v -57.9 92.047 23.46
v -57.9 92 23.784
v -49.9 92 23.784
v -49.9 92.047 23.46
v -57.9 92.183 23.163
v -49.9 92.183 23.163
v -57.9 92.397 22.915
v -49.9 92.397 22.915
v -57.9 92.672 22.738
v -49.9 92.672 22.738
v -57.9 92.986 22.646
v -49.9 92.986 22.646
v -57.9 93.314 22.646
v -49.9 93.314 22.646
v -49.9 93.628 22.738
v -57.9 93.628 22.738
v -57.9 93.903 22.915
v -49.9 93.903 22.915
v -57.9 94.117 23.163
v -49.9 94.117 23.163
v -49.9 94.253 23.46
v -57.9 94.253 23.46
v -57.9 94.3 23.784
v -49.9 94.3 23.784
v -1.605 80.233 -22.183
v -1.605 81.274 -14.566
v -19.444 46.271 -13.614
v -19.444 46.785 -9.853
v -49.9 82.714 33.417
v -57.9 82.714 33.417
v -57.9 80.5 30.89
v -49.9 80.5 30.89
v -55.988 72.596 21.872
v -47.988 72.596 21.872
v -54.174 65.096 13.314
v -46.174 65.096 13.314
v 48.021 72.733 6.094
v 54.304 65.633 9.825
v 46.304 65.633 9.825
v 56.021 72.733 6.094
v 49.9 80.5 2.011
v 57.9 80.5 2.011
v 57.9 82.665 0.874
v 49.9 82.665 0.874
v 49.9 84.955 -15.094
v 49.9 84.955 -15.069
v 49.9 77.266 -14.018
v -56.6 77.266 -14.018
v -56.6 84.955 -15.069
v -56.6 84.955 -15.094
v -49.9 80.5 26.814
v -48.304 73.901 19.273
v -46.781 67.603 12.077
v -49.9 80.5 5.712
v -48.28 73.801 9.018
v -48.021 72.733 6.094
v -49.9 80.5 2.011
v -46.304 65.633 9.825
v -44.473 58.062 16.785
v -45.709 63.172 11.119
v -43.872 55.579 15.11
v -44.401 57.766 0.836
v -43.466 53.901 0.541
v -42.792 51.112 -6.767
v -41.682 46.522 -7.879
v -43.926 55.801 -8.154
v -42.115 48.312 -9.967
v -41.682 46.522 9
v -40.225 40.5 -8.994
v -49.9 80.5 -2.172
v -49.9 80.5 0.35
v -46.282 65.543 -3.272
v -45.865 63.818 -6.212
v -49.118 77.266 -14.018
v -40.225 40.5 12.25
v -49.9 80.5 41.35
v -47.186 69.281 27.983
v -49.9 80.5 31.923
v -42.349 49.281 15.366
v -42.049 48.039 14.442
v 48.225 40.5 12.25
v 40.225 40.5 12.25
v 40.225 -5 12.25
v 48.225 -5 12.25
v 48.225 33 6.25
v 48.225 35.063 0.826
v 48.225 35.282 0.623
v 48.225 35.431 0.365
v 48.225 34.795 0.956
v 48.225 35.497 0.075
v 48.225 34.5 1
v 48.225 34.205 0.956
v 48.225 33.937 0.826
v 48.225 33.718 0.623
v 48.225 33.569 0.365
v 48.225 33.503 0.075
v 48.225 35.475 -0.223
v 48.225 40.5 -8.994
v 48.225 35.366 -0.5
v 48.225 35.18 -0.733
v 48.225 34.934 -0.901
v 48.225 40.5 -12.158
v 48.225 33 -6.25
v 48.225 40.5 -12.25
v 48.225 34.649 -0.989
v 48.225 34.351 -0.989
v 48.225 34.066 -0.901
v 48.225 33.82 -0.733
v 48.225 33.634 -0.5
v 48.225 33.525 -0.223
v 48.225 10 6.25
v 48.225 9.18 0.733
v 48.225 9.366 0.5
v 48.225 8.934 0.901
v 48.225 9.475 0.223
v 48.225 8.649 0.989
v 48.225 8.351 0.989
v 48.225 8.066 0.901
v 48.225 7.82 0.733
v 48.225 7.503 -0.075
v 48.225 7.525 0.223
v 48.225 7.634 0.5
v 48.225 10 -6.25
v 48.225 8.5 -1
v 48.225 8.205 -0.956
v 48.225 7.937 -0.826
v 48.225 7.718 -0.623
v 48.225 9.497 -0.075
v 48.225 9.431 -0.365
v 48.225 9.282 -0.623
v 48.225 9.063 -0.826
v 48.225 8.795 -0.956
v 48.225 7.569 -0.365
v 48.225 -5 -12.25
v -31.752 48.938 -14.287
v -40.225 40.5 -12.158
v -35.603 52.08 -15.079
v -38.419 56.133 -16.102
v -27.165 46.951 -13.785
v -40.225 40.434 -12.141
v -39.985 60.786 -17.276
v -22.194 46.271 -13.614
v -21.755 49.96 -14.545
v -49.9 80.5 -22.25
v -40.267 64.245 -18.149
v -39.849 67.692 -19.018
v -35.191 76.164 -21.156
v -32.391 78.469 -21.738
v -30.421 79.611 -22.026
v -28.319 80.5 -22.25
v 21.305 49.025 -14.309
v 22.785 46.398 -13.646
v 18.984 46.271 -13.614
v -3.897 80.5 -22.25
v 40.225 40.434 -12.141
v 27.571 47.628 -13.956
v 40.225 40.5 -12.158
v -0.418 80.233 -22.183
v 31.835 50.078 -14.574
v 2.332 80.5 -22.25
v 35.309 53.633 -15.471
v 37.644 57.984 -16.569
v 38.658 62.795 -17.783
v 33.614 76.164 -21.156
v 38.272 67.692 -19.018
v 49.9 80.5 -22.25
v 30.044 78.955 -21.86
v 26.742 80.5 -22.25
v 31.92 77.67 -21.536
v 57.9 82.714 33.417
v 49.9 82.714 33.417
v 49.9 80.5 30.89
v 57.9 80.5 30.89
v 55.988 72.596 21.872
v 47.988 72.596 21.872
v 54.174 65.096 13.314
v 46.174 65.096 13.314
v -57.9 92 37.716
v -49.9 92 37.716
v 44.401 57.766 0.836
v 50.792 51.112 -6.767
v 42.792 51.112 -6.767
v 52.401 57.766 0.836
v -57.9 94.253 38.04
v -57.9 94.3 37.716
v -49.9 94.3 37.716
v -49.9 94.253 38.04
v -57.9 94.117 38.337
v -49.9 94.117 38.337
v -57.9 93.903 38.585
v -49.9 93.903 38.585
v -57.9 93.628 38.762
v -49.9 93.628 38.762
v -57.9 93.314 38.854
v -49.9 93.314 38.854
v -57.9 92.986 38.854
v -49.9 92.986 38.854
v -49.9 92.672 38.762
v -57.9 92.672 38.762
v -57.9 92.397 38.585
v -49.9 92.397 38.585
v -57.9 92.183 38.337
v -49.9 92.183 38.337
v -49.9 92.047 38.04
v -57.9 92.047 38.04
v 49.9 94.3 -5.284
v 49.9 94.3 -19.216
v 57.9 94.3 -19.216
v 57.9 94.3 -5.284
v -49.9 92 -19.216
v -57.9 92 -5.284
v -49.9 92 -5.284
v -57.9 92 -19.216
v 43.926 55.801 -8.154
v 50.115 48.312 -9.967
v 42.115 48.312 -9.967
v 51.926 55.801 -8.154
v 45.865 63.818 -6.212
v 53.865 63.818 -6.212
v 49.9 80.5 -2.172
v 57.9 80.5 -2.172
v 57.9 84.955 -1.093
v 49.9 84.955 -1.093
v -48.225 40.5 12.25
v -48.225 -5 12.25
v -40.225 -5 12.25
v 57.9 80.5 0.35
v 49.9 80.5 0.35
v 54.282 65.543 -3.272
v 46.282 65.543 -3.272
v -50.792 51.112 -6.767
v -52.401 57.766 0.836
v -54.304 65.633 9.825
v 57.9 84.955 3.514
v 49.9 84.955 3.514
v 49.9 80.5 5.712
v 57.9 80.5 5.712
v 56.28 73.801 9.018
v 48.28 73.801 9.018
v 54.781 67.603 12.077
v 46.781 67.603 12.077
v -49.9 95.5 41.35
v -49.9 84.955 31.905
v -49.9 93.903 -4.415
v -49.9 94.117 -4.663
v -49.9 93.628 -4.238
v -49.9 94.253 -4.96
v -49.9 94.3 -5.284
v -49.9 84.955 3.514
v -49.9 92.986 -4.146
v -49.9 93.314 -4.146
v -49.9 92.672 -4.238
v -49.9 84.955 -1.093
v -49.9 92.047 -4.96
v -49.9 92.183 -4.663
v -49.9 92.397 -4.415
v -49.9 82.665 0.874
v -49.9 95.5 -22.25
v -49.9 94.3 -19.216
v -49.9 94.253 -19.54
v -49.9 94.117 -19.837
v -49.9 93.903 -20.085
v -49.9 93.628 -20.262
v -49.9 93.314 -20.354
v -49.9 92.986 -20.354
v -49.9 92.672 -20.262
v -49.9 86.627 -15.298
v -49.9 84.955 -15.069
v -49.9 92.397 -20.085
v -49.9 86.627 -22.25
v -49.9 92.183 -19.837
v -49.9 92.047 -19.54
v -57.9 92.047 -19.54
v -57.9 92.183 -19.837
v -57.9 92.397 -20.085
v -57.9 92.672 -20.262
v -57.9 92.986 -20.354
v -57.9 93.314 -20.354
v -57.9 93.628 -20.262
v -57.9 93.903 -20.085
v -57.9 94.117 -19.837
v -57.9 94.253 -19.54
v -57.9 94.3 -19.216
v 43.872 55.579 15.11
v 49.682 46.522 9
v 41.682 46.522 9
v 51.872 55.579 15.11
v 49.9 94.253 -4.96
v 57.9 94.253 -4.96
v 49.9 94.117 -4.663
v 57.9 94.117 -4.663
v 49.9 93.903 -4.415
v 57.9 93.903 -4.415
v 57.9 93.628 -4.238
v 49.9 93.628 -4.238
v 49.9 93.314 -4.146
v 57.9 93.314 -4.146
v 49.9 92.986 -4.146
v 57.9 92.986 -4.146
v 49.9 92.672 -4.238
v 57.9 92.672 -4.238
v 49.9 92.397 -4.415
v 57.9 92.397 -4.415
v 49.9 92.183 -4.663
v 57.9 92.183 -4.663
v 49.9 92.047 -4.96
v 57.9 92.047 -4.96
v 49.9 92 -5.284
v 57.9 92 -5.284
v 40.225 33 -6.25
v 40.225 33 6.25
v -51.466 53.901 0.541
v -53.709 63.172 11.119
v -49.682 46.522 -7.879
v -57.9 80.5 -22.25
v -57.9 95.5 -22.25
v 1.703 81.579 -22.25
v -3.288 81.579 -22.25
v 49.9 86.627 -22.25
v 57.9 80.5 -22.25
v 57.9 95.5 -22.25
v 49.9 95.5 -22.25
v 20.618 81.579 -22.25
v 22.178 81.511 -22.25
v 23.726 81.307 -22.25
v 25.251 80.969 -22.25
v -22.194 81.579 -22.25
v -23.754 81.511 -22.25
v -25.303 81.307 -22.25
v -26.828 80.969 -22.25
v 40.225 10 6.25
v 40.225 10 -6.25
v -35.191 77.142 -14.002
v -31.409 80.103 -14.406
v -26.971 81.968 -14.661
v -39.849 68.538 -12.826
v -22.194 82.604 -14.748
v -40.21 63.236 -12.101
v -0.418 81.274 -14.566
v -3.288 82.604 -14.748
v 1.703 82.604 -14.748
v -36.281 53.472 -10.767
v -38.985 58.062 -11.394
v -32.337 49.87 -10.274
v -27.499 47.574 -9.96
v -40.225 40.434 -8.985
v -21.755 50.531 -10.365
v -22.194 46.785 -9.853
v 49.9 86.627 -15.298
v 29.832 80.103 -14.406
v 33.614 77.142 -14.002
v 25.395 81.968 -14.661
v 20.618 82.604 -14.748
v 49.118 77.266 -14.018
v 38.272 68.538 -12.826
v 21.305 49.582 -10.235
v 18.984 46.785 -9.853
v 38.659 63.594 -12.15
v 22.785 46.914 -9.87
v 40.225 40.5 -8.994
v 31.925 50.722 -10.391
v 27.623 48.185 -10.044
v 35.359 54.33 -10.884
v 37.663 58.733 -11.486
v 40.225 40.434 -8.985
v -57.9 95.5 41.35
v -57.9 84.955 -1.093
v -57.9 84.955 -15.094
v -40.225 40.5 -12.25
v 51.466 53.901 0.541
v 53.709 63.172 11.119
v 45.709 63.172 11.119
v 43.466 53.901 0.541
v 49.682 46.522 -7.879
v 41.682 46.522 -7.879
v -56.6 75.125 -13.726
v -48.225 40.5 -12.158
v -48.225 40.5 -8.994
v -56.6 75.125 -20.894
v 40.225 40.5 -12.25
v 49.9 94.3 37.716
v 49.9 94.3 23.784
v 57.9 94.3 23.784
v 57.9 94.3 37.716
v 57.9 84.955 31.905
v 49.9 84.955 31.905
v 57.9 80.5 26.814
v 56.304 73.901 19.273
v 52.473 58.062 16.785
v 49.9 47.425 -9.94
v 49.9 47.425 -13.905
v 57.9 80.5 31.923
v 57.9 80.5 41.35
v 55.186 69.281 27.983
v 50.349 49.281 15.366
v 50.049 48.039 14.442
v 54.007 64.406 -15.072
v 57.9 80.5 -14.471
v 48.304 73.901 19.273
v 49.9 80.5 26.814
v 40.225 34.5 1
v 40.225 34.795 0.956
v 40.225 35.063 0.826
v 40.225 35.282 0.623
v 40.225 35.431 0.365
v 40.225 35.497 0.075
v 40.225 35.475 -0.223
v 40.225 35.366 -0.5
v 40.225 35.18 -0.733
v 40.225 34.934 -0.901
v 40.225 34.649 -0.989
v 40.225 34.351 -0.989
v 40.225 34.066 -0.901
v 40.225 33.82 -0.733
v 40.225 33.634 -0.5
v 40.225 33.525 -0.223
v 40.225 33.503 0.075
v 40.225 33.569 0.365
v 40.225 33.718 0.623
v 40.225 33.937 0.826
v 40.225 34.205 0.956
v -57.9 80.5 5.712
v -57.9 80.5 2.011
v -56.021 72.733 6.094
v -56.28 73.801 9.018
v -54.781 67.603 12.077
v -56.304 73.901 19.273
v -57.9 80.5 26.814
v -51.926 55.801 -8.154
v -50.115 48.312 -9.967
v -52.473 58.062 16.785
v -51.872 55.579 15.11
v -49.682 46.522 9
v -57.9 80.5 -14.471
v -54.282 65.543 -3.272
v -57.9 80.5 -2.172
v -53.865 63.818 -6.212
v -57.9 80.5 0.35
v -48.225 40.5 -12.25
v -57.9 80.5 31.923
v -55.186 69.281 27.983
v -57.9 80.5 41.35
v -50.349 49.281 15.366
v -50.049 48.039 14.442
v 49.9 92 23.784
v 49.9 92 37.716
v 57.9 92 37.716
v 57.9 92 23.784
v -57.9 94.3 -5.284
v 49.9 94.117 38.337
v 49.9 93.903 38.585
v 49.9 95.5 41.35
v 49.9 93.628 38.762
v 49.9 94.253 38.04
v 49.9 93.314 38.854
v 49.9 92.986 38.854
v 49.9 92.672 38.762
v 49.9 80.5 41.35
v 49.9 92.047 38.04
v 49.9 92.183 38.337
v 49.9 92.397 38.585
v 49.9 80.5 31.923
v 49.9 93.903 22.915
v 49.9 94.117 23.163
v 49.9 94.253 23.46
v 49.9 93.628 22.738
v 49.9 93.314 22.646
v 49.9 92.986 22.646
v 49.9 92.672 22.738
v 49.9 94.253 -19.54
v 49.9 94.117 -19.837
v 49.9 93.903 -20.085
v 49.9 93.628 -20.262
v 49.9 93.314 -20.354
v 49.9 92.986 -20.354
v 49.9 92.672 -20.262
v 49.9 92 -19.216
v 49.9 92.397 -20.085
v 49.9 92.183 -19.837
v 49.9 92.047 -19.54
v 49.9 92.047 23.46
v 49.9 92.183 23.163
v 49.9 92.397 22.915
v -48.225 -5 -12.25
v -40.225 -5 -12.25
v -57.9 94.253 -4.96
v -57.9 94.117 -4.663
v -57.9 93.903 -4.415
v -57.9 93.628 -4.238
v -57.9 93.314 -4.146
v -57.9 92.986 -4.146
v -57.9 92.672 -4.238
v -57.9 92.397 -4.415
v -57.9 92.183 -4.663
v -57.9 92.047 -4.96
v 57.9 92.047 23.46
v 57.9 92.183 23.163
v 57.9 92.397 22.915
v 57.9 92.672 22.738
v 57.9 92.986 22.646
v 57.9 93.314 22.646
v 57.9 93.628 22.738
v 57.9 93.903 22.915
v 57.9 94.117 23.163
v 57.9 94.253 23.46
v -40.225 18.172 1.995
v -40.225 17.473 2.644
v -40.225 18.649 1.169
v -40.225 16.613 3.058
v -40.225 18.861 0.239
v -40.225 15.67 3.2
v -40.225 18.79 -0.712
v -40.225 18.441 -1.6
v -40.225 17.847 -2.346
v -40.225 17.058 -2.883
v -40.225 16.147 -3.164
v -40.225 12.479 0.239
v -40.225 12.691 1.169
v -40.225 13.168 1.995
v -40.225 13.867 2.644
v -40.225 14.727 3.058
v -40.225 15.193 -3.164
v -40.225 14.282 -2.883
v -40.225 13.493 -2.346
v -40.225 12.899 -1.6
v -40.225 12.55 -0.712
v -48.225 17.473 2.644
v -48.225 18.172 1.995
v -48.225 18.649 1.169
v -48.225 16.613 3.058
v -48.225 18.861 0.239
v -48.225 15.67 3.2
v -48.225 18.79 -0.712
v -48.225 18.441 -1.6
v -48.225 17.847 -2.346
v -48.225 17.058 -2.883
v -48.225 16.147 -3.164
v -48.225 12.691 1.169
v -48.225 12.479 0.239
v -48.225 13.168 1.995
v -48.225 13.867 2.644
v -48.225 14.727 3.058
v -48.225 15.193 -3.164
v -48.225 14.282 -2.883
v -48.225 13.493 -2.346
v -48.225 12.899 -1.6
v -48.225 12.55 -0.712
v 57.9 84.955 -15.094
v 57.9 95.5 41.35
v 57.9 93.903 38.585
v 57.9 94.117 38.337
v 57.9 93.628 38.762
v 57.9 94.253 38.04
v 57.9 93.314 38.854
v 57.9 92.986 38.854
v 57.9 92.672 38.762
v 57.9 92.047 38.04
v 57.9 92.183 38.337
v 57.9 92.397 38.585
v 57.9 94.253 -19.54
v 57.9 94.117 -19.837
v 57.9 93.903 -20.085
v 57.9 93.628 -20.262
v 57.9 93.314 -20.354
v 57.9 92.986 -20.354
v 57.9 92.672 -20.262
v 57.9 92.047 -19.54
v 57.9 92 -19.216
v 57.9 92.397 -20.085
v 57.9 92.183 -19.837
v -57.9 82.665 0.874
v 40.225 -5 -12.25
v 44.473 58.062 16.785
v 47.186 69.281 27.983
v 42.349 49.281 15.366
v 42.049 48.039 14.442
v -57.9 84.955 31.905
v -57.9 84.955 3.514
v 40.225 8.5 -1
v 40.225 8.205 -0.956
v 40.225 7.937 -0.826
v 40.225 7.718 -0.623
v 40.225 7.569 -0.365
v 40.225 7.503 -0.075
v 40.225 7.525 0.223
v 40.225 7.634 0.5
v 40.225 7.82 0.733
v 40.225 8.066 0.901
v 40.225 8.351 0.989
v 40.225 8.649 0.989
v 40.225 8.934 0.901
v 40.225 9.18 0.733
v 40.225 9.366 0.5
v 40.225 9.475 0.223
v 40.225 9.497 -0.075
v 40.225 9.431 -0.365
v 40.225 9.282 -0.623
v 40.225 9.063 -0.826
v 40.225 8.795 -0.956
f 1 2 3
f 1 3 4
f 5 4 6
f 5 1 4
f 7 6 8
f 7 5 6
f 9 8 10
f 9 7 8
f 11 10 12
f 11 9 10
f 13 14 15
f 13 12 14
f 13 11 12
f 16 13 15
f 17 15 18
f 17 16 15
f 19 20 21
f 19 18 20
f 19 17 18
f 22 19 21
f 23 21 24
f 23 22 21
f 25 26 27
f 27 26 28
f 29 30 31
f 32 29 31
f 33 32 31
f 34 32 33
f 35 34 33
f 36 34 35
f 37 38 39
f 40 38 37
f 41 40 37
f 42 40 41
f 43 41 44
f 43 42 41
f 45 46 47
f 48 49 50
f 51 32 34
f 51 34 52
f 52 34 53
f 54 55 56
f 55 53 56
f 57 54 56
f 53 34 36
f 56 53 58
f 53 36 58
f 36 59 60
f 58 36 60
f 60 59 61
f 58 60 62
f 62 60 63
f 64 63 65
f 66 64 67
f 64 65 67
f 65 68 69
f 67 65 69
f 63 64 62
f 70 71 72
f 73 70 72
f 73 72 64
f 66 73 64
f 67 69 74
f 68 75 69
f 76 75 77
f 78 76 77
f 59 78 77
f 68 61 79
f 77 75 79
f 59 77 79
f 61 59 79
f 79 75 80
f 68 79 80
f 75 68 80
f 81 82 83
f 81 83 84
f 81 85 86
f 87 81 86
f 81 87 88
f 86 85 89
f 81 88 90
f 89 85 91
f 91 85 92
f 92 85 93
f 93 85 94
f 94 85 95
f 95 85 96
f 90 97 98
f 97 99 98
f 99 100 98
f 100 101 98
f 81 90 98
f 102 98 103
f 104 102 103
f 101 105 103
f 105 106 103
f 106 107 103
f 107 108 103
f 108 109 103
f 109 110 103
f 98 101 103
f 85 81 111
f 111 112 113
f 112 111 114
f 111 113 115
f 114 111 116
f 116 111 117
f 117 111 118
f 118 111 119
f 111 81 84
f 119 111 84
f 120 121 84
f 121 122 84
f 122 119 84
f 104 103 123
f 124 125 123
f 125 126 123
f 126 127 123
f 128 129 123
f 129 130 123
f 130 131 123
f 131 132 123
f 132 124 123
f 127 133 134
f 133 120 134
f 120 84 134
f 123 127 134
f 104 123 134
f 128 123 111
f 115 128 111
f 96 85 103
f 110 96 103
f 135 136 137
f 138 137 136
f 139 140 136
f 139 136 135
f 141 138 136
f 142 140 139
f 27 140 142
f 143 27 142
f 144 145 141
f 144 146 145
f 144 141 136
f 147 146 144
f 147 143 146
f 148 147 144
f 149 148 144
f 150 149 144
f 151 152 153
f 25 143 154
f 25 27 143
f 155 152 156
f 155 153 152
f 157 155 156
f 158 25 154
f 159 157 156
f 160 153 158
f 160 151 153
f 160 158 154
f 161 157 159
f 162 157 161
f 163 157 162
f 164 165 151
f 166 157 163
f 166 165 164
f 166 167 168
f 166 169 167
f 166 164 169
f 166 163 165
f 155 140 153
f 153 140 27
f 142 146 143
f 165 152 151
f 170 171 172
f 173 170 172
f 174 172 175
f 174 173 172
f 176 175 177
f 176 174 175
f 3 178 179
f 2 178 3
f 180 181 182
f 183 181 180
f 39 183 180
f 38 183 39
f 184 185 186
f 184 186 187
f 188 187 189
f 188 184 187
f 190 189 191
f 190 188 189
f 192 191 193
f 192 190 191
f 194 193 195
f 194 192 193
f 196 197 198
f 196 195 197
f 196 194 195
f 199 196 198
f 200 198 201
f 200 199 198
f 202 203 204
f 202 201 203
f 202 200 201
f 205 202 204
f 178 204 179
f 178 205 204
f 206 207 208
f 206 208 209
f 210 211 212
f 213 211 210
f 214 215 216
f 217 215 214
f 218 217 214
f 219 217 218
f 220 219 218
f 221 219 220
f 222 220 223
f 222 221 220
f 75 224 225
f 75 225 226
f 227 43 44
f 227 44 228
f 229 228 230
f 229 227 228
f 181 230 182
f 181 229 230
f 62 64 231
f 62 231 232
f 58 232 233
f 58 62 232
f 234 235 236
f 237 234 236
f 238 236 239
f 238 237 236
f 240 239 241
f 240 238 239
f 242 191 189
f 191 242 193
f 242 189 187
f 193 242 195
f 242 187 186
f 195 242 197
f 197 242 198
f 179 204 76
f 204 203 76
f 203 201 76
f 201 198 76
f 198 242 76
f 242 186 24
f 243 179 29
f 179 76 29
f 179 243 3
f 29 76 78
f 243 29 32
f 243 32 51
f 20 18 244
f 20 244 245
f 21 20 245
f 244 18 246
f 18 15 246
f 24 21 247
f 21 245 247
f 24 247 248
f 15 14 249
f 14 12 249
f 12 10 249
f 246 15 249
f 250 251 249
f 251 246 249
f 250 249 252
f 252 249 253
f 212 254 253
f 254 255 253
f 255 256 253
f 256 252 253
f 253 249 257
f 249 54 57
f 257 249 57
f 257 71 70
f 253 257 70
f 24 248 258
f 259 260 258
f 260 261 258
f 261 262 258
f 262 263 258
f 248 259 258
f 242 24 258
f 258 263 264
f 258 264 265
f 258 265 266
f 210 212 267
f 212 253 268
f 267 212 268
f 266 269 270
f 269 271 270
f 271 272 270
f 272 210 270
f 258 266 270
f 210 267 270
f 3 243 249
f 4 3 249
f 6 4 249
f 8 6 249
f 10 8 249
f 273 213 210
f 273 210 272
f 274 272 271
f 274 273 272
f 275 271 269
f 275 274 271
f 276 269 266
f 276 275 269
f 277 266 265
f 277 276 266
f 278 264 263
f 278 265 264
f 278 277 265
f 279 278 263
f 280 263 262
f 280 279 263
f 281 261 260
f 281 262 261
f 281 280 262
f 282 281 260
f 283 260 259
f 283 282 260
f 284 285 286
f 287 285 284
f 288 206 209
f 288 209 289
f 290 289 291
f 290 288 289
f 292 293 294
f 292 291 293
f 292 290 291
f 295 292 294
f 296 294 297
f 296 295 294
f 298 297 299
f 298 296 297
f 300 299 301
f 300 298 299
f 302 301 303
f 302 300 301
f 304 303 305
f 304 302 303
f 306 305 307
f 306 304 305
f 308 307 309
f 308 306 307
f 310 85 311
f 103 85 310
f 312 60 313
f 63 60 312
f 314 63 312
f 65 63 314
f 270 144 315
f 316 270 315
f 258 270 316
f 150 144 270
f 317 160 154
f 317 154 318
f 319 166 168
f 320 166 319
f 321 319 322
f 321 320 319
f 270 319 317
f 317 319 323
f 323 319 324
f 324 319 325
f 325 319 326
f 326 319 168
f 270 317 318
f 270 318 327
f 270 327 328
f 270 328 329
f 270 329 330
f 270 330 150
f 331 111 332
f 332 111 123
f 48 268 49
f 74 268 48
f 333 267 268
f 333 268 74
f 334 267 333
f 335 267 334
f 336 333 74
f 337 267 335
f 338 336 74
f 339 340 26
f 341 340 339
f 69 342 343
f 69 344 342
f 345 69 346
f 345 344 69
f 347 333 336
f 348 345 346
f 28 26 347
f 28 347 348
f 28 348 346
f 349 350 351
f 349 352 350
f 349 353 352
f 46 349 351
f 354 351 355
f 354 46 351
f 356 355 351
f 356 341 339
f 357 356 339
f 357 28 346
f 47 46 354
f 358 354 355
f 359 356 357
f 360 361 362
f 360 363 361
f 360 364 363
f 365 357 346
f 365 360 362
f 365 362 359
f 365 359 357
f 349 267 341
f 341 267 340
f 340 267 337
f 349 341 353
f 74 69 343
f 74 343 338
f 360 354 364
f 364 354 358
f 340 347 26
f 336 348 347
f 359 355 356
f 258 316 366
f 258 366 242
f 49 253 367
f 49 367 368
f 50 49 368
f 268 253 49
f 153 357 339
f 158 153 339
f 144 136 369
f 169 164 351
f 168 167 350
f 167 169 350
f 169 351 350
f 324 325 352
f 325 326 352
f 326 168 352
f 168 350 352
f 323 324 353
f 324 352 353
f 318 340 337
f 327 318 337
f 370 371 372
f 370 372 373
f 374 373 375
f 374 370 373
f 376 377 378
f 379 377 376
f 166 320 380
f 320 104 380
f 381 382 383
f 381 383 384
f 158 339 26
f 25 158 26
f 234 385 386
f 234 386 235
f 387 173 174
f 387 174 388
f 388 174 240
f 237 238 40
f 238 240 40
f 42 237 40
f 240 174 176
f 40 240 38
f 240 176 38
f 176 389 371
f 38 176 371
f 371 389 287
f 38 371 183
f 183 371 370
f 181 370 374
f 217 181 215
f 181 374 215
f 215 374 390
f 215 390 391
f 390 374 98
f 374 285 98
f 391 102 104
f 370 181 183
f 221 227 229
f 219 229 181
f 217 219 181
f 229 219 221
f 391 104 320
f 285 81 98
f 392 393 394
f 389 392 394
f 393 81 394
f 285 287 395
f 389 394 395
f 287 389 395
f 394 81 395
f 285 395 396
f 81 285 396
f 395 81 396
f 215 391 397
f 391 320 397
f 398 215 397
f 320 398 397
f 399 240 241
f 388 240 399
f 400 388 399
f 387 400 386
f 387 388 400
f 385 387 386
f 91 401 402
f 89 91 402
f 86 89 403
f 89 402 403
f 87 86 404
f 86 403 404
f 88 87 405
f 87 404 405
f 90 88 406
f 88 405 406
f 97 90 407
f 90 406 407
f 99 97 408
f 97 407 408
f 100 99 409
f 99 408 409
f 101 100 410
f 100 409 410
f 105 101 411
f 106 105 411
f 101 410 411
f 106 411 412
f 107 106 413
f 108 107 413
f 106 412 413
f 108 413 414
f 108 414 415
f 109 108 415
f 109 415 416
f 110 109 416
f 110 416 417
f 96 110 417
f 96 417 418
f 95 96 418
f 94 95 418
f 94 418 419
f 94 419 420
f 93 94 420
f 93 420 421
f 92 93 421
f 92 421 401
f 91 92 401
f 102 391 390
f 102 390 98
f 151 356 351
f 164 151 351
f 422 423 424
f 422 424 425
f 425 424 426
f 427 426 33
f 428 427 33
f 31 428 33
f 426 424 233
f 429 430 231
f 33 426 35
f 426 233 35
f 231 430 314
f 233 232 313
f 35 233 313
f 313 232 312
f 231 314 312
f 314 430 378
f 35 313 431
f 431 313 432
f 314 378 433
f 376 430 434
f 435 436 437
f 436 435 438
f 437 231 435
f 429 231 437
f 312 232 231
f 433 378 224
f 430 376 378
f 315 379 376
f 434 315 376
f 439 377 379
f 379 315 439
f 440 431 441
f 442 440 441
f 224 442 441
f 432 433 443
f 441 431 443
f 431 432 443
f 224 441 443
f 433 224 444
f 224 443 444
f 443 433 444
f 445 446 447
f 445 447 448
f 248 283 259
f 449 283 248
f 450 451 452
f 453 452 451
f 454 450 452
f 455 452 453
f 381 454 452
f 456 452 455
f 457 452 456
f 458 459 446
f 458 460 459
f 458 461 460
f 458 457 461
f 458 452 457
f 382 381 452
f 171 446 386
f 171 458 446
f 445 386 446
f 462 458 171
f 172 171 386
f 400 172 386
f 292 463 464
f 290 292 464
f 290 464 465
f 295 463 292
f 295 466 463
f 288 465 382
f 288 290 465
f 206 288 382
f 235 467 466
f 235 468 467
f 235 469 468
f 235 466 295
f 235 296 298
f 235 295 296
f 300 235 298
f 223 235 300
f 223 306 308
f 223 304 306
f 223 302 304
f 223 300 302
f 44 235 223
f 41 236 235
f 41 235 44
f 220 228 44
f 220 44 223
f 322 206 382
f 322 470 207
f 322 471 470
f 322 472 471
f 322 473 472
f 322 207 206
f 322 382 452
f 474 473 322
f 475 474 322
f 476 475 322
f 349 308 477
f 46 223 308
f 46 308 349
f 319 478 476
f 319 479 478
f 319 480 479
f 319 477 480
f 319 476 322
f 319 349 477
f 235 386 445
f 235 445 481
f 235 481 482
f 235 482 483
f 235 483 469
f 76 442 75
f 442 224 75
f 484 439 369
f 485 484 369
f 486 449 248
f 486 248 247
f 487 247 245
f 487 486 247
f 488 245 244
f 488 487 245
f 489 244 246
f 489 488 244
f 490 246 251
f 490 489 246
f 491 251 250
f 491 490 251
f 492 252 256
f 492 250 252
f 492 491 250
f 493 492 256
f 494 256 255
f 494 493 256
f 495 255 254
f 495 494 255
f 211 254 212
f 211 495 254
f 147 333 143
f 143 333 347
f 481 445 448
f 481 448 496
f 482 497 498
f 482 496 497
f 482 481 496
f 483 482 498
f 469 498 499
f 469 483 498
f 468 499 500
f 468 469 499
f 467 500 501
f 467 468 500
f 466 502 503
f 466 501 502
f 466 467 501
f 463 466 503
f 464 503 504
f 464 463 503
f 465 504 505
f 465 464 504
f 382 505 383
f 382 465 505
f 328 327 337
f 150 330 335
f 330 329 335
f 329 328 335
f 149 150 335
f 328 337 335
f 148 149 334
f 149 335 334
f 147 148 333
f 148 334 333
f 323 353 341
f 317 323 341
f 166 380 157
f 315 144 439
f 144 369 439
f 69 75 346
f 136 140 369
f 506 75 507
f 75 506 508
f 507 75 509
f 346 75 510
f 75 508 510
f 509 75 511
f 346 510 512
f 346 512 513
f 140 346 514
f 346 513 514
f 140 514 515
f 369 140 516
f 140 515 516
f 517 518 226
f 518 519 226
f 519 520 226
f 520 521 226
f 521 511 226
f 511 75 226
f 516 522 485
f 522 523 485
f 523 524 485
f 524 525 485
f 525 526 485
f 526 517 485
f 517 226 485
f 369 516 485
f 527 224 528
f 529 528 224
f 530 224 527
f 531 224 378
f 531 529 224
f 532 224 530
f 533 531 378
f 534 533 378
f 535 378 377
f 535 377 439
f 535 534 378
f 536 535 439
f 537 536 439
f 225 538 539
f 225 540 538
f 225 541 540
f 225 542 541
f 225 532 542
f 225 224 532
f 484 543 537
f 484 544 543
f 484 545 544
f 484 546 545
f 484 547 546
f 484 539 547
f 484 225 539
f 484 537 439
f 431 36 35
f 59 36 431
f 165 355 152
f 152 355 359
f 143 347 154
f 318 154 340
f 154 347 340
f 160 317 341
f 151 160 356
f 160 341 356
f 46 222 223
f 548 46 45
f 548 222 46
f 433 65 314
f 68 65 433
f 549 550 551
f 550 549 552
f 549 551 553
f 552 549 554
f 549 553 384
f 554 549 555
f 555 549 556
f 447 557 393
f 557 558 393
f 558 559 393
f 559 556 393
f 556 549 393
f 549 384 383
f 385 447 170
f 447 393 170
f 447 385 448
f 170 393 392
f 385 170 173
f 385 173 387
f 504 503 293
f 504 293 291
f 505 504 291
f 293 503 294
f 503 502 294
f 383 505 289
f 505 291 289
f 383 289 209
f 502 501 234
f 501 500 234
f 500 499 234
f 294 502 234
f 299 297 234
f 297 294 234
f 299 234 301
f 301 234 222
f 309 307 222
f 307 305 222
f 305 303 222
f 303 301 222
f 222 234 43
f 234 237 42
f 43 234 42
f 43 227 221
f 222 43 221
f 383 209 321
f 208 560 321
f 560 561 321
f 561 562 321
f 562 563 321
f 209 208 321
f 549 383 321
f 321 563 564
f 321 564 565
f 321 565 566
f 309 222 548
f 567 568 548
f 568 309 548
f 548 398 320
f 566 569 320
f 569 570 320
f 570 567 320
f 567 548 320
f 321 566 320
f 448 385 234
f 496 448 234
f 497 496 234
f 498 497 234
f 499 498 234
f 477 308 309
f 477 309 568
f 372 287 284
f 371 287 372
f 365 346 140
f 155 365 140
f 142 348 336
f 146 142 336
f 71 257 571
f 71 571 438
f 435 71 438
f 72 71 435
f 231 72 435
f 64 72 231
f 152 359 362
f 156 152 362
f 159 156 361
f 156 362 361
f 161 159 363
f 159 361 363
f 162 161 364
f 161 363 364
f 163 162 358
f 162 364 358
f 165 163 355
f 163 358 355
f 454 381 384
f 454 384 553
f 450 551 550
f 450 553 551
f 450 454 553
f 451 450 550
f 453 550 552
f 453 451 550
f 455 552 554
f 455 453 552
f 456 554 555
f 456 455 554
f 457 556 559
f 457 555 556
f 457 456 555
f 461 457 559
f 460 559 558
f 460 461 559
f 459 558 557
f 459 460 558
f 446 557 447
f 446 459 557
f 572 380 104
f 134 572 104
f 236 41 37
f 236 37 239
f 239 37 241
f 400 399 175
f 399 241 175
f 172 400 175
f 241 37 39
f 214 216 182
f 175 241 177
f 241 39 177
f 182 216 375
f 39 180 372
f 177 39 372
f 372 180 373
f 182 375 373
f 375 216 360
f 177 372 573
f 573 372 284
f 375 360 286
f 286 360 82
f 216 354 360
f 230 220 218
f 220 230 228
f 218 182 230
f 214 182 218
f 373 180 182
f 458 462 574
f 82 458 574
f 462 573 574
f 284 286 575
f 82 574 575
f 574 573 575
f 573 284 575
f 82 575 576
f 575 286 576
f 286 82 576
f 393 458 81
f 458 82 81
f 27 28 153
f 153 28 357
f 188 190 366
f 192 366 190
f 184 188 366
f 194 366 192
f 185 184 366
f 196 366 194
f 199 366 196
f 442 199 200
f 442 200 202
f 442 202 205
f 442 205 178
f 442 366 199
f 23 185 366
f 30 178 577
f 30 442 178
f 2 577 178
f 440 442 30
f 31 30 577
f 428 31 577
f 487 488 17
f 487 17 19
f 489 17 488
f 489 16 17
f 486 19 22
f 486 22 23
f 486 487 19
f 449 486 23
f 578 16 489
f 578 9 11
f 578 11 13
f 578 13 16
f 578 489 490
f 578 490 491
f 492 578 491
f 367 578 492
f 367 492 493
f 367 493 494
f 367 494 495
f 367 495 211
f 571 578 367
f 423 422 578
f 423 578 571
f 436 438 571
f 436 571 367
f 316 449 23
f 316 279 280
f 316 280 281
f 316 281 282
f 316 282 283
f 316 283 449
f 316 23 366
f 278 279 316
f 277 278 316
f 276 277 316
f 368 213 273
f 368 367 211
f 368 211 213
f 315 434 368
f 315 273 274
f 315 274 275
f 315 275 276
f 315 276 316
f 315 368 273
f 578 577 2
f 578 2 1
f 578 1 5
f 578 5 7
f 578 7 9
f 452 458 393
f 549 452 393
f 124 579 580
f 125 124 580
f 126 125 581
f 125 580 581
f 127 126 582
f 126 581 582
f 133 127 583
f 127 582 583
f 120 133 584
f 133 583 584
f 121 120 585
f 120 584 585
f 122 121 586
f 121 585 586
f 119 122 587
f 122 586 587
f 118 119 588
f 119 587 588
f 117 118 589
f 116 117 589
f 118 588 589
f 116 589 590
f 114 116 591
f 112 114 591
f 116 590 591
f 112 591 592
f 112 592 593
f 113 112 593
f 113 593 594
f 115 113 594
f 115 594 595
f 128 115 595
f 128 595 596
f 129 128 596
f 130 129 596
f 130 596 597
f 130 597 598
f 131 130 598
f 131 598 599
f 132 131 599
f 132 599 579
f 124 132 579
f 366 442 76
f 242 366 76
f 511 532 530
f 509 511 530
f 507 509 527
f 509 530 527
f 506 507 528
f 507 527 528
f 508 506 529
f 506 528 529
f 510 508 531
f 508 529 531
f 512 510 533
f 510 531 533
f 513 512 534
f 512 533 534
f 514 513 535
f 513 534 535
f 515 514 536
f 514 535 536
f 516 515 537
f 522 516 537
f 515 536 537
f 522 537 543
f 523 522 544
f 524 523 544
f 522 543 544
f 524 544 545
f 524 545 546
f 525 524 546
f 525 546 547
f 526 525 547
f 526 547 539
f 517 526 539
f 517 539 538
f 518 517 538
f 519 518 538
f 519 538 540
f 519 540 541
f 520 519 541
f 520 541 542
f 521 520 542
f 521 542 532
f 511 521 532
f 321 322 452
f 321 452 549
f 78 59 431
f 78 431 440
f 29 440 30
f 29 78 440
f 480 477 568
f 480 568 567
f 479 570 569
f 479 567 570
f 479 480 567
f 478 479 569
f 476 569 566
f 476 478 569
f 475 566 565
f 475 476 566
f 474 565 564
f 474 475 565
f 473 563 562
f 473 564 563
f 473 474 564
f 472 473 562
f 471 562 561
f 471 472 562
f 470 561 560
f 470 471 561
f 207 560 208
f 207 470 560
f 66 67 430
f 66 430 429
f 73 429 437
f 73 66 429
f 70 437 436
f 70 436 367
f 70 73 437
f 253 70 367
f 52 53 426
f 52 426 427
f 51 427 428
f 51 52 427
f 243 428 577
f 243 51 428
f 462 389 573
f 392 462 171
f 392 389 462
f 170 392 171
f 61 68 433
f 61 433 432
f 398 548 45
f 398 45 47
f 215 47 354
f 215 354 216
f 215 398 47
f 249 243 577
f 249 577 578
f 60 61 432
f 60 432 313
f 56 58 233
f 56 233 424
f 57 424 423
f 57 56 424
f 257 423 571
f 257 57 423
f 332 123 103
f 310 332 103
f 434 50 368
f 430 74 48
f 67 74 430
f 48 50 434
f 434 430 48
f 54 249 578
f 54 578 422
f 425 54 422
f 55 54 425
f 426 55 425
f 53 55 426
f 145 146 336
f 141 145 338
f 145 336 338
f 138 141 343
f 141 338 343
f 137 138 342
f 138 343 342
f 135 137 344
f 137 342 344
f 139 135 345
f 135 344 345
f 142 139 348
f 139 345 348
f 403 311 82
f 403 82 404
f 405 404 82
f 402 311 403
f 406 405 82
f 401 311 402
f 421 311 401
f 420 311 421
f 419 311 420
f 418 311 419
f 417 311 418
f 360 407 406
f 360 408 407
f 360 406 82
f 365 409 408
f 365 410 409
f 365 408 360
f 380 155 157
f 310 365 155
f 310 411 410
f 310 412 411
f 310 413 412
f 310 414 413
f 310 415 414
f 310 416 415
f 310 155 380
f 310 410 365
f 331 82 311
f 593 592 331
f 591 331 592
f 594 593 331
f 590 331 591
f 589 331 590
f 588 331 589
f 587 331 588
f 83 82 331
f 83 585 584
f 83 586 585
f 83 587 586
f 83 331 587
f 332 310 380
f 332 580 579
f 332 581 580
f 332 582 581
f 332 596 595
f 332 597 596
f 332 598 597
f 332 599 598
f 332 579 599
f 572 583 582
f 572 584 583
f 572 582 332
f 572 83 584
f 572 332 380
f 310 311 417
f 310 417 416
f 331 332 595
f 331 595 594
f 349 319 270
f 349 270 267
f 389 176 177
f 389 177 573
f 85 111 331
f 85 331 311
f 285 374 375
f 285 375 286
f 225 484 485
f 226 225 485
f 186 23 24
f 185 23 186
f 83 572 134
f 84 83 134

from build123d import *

# Parameters (mm, degrees)
BOSS_EXTRU_1_DEPTH                    = 40.5
BOSS_EXTRU_1_DEPTH_BACK               = 5
ESQUISSE1_W                           = 8
ESQUISSE1_H                           = 24.5
BOSS_EXTRU_1_2_DEPTH                  = 40.5
BOSS_EXTRU_1_2_DEPTH_BACK             = 5
ESQUISSE3_R                           = 3.2
ENL_V_MAT_EXTRU_1_DEPTH               = 10.5
ESQUISSE4_W                           = 12.5
ESQUISSE4_H                           = 23
ENL_V_MAT_EXTRU_2_DEPTH               = 10.5
ESQUISSE5_W                           = 8
ESQUISSE5_H                           = 63.6
BOSS_EXTRU_2_DEPTH                    = 15
BOSS_EXTRU_2_2_DEPTH                  = 15
ENL_V_MAT_EXTRU_3_DEPTH               = 156.691080348
ENL_V_START                           = -115.8
ENL_V_MAT_EXTRU_6_DEPTH               = 17.675
ENL_V_START_2                         = -17.675
ENL_V_MAT_EXTRU_6_2_DEPTH             = 17.675
BOSS_EXTRU_3_DEPTH                    = 106.5
ENL_VEMENT_START                      = -22.25
ENL_VEMENT_DE_MATI_RE_BALAYAGE1_DEPTH = 63.6
ENL_VEMENT_DE_MATI_RE_BALAYAGE2_DEPTH = 63.6
ENL_V_MAT_EXTRU_11_DEPTH              = 14
ESQUISSE14_R                          = 1
ENL_V_MAT_EXTRU_12_DEPTH              = 14


with BuildPart() as part:
    # Esquisse1 → Boss.-Extru.1 (new, two sides: drawn at the far end of the back side and taken through both)
    with BuildSketch(Plane(origin=(0, 0, 0), x_dir=(1, 0, 0), z_dir=(0, 1, 0)).offset(-BOSS_EXTRU_1_DEPTH_BACK)):
        with Locations((-44.225, 0)):
            Rectangle(ESQUISSE1_W, ESQUISSE1_H)
    extrude(amount=BOSS_EXTRU_1_DEPTH + BOSS_EXTRU_1_DEPTH_BACK)

    # Esquisse3 → Enlèv. mat.-Extru.1 (cut)
    with BuildSketch(Plane.ZY.offset(48.225)):
        with Locations((0, 15.67)):
            Circle(ESQUISSE3_R)
    extrude(amount=-ENL_V_MAT_EXTRU_1_DEPTH, mode=Mode.SUBTRACT)


with BuildPart() as body_2:
    # Esquisse1 → Boss.-Extru.1 2 (new, two sides: drawn at the far end of the back side and taken through both)
    with BuildSketch(Plane(origin=(0, 0, 0), x_dir=(1, 0, 0), z_dir=(0, 1, 0)).offset(-BOSS_EXTRU_1_2_DEPTH_BACK)):
        with Locations((44.225, 0)):
            Rectangle(ESQUISSE1_W, ESQUISSE1_H)
    extrude(amount=BOSS_EXTRU_1_2_DEPTH + BOSS_EXTRU_1_2_DEPTH_BACK)

    # Esquisse4 → Enlèv. mat.-Extru.2 (cut)
    with BuildSketch(Plane(origin=(48.225, 0, 0), x_dir=(0, 0, -1), z_dir=(1, 0, 0))):
        with Locations((0, 21.5)):
            Rectangle(ESQUISSE4_W, ESQUISSE4_H)
    extrude(amount=-ENL_V_MAT_EXTRU_2_DEPTH, mode=Mode.SUBTRACT)


with BuildPart() as body_3:
    # Esquisse5 → Boss.-Extru.2 (new body)
    with BuildSketch(Plane(origin=(0, 80.5, 0), x_dir=(1, 0, 0), z_dir=(0, 1, 0))):
        with Locations((-53.9, -9.55)):
            Rectangle(ESQUISSE5_W, ESQUISSE5_H)
    extrude(amount=BOSS_EXTRU_2_DEPTH)


with BuildPart() as body_4:
    # Esquisse5 → Boss.-Extru.2 2 (new body)
    with BuildSketch(Plane(origin=(0, 80.5, 0), x_dir=(1, 0, 0), z_dir=(0, 1, 0))):
        with Locations((53.9, -9.55)):
            Rectangle(ESQUISSE5_W, ESQUISSE5_H)
    extrude(amount=BOSS_EXTRU_2_2_DEPTH)


with BuildPart() as enl_v_mat_extru_3_tool:
    # Esquisse6 → Enlèv. mat.-Extru.3 (new, through all)
    with BuildSketch(Plane.ZY.offset(57.9)):
        with BuildLine():
            Line((-19.215648746, 94.3), (-5.284351254, 94.3))
            ThreePointArc((-5.284351254, 94.3), (-4.134351254, 93.15), (-5.284351254, 92))
            Line((-5.284351254, 92), (-19.215648746, 92))
            ThreePointArc((-19.215648746, 92), (-20.365648746, 93.15), (-19.215648746, 94.3))
        make_face()
        with BuildLine():
            Line((23.784351254, 94.3), (37.715648746, 94.3))
            ThreePointArc((37.715648746, 94.3), (38.865648746, 93.15), (37.715648746, 92))
            Line((37.715648746, 92), (23.784351254, 92))
            ThreePointArc((23.784351254, 92), (22.634351254, 93.15), (23.784351254, 94.3))
        make_face()
    extrude(amount=-ENL_V_MAT_EXTRU_3_DEPTH)


with BuildPart() as body_3_1:
    add(body_3.part)

    # Enlèv. mat.-Extru.3: cut by enl_v_mat_extru_3_tool
    add(enl_v_mat_extru_3_tool.part, mode=Mode.SUBTRACT)


    add(part.part)  # lissage2 joins it to this body
    # loft from a face of the part (lissage2)
    loft([body_3_1.faces().sort_by_distance((-53.9, 80.5, 9.55))[0], body_3_1.faces().sort_by_distance((-44.225, 40.5, 0))[0]])

    # Enl_v. mat.-Extru.6 2 outline → Enl_v. mat.-Extru.6 2 (cut)
    with BuildSketch(Plane.ZY.offset(57.9).offset(ENL_V_START_2)):
        Polygon((16.7851704, 58.061718477), (33.416643679, 82.714263273), (13.314021784, 65.095678551), align=None)
        Polygon((-7.878685189, 46.521708187), (8.999873816, 46.521708187), (15.109936371, 55.57854809), (11.118967449, 63.171862295), align=None)
        Polygon((3.513606596, 84.955309113), (12.07666079, 67.60307561), (31.90475538, 84.955309113), align=None)
        Polygon((-1.093401297, 84.955309113), (-15.094337023, 84.955309113), (-9.967028833, 48.311900258), align=None)
        Polygon((9.825440903, 65.632957253), (0.873750807, 82.664659801), (-6.767009008, 51.112345403), align=None)
    extrude(amount=ENL_V_MAT_EXTRU_6_2_DEPTH, mode=Mode.SUBTRACT)



with BuildPart() as body_4_1:
    add(body_4.part)

    # Enlèv. mat.-Extru.3: cut by enl_v_mat_extru_3_tool
    add(enl_v_mat_extru_3_tool.part, mode=Mode.SUBTRACT)


    add(body_2.part)  # lissage1 joins it to this body
    # loft from a face of the part (lissage1)
    loft([body_4_1.faces().sort_by_distance((53.9, 80.5, 9.55))[0], body_4_1.faces().sort_by_distance((44.225, 40.5, 0))[0]])

    # Enlèv. mat.-Extru.6: read off the stored shape, not the designer's step
    # Enlèv. mat.-Extru.6 outline → Enlèv. mat.-Extru.6 (cut)
    with BuildSketch(Plane.ZY.offset(57.9).offset(ENL_V_START)):
        Polygon((16.7851704, 58.061718477), (33.416643679, 82.714263273), (13.314021784, 65.095678551), align=None)
        Polygon((-7.878685189, 46.521708187), (8.999873816, 46.521708187), (15.109936371, 55.57854809), (11.118967449, 63.171862295), align=None)
        Polygon((3.513606596, 84.955309113), (12.07666079, 67.60307561), (31.90475538, 84.955309113), align=None)
        Polygon((-1.093401297, 84.955309113), (-15.094337023, 84.955309113), (-9.967028833, 48.311900258), align=None)
        Polygon((9.825440903, 65.632957253), (0.873750807, 82.664659801), (-6.767009008, 51.112345403), align=None)
    extrude(amount=ENL_V_MAT_EXTRU_6_DEPTH, mode=Mode.SUBTRACT)


with BuildPart() as body_3_2:
    add(body_3_1.part)

    add(body_4_1.part)  # Boss.-Extru.3 merges body 4
    # Esquisse9 → Boss.-Extru.3 (add)
    with BuildSketch(Plane.ZY.offset(-49.9)):
        Polygon((-22.25, 86.627151597), (-15.29778178, 86.627151597), (-8.984735346, 40.434496389), (-12.141258563, 40.434496389), (-22.25, 80.5), align=None)
    extrude(amount=BOSS_EXTRU_3_DEPTH)

    # Enlèvement de matière-Balayage1: read off the stored shape, not the designer's step
    # Enlèvement de matière-Balayage1 outline → Enlèvement de matière-Balayage1 (cut)
    with BuildSketch(Plane.XY.offset(ENL_VEMENT_START)):
        Polygon((49.9, 47.425064599), (48.225, 40.5), (48.225, 40.434496389), (49.9, 40.434496389), align=None)
    extrude(amount=ENL_VEMENT_DE_MATI_RE_BALAYAGE1_DEPTH, mode=Mode.SUBTRACT)

    # Enlèvement de matière-Balayage2: read off the stored shape, not the designer's step
    # Enlèvement de matière-Balayage2 outline → Enlèvement de matière-Balayage2 (cut)
    with BuildSketch(Plane.XY.offset(ENL_VEMENT_START)):
        Polygon((-48.225, 40.5), (-56.6, 75.125322997), (-56.6, 40.434496389), (-48.225, 40.434496389), align=None)
    extrude(amount=ENL_VEMENT_DE_MATI_RE_BALAYAGE2_DEPTH, mode=Mode.SUBTRACT)

    # Esquisse11 → Enlèv. mat.-Extru.11 (cut)
    with BuildSketch(Plane(origin=(0, -0.46401808, -3.395227235), x_dir=(1, 0, 0), z_dir=(0, 0.13540901456567775, 0.9907897853603217))):
        with BuildLine():
            Line((-3.287535233, 83.840431949), (-22.194472995, 83.840431949))
            ThreePointArc((-22.194472995, 83.840431949), (-29.253068949, 82.405282441), (-35.190824132, 78.327722591))
            Line((-35.190824132, 78.327722591), (-21.755006049, 51.469546885))
            Line((-21.755006049, 51.469546885), (-3.287535233, 83.840431949))
        make_face()
        with BuildLine():
            Line((-22.194472995, 47.688497503), (-39.849249541, 69.643827584))
            ThreePointArc((-39.849249541, 69.643827584), (-36.281059291, 54.43712269), (-22.194472995, 47.688497503))
        make_face()
        Polygon((-1.60521279, 82.498170098), (-19.443998314, 47.688497503), (18.984093957, 47.688497503), (-0.418307097, 82.498170098), align=None)
        with BuildLine():
            Line((20.617642495, 83.840431949), (1.70297306, 83.840431949))
            Line((1.70297306, 83.840431949), (21.304692687, 50.51147286))
            Line((21.304692687, 50.51147286), (33.613993633, 78.327722591))
            ThreePointArc((33.613993633, 78.327722591), (27.676238449, 82.405282441), (20.617642495, 83.840431949))
        make_face()
        with BuildLine():
            ThreePointArc((22.784876191, 47.818888972), (35.359080989, 55.303557395), (38.272419041, 69.643827584))
            Line((38.272419041, 69.643827584), (22.784876191, 47.818888972))
        make_face()
    extrude(amount=-ENL_V_MAT_EXTRU_11_DEPTH, mode=Mode.SUBTRACT)

    # Esquisse14 → Enlèv. mat.-Extru.12 (cut)
    with BuildSketch(Plane.ZY.offset(-40.225)):
        with Locations((0, 34.5)):
            Circle(ESQUISSE14_R)
        with Locations(Location((0, 8.5, 0), (0, 0, 180))):
            Circle(ESQUISSE14_R)
    extrude(amount=-ENL_V_MAT_EXTRU_12_DEPTH, mode=Mode.SUBTRACT)


solid = body_3_2.part
